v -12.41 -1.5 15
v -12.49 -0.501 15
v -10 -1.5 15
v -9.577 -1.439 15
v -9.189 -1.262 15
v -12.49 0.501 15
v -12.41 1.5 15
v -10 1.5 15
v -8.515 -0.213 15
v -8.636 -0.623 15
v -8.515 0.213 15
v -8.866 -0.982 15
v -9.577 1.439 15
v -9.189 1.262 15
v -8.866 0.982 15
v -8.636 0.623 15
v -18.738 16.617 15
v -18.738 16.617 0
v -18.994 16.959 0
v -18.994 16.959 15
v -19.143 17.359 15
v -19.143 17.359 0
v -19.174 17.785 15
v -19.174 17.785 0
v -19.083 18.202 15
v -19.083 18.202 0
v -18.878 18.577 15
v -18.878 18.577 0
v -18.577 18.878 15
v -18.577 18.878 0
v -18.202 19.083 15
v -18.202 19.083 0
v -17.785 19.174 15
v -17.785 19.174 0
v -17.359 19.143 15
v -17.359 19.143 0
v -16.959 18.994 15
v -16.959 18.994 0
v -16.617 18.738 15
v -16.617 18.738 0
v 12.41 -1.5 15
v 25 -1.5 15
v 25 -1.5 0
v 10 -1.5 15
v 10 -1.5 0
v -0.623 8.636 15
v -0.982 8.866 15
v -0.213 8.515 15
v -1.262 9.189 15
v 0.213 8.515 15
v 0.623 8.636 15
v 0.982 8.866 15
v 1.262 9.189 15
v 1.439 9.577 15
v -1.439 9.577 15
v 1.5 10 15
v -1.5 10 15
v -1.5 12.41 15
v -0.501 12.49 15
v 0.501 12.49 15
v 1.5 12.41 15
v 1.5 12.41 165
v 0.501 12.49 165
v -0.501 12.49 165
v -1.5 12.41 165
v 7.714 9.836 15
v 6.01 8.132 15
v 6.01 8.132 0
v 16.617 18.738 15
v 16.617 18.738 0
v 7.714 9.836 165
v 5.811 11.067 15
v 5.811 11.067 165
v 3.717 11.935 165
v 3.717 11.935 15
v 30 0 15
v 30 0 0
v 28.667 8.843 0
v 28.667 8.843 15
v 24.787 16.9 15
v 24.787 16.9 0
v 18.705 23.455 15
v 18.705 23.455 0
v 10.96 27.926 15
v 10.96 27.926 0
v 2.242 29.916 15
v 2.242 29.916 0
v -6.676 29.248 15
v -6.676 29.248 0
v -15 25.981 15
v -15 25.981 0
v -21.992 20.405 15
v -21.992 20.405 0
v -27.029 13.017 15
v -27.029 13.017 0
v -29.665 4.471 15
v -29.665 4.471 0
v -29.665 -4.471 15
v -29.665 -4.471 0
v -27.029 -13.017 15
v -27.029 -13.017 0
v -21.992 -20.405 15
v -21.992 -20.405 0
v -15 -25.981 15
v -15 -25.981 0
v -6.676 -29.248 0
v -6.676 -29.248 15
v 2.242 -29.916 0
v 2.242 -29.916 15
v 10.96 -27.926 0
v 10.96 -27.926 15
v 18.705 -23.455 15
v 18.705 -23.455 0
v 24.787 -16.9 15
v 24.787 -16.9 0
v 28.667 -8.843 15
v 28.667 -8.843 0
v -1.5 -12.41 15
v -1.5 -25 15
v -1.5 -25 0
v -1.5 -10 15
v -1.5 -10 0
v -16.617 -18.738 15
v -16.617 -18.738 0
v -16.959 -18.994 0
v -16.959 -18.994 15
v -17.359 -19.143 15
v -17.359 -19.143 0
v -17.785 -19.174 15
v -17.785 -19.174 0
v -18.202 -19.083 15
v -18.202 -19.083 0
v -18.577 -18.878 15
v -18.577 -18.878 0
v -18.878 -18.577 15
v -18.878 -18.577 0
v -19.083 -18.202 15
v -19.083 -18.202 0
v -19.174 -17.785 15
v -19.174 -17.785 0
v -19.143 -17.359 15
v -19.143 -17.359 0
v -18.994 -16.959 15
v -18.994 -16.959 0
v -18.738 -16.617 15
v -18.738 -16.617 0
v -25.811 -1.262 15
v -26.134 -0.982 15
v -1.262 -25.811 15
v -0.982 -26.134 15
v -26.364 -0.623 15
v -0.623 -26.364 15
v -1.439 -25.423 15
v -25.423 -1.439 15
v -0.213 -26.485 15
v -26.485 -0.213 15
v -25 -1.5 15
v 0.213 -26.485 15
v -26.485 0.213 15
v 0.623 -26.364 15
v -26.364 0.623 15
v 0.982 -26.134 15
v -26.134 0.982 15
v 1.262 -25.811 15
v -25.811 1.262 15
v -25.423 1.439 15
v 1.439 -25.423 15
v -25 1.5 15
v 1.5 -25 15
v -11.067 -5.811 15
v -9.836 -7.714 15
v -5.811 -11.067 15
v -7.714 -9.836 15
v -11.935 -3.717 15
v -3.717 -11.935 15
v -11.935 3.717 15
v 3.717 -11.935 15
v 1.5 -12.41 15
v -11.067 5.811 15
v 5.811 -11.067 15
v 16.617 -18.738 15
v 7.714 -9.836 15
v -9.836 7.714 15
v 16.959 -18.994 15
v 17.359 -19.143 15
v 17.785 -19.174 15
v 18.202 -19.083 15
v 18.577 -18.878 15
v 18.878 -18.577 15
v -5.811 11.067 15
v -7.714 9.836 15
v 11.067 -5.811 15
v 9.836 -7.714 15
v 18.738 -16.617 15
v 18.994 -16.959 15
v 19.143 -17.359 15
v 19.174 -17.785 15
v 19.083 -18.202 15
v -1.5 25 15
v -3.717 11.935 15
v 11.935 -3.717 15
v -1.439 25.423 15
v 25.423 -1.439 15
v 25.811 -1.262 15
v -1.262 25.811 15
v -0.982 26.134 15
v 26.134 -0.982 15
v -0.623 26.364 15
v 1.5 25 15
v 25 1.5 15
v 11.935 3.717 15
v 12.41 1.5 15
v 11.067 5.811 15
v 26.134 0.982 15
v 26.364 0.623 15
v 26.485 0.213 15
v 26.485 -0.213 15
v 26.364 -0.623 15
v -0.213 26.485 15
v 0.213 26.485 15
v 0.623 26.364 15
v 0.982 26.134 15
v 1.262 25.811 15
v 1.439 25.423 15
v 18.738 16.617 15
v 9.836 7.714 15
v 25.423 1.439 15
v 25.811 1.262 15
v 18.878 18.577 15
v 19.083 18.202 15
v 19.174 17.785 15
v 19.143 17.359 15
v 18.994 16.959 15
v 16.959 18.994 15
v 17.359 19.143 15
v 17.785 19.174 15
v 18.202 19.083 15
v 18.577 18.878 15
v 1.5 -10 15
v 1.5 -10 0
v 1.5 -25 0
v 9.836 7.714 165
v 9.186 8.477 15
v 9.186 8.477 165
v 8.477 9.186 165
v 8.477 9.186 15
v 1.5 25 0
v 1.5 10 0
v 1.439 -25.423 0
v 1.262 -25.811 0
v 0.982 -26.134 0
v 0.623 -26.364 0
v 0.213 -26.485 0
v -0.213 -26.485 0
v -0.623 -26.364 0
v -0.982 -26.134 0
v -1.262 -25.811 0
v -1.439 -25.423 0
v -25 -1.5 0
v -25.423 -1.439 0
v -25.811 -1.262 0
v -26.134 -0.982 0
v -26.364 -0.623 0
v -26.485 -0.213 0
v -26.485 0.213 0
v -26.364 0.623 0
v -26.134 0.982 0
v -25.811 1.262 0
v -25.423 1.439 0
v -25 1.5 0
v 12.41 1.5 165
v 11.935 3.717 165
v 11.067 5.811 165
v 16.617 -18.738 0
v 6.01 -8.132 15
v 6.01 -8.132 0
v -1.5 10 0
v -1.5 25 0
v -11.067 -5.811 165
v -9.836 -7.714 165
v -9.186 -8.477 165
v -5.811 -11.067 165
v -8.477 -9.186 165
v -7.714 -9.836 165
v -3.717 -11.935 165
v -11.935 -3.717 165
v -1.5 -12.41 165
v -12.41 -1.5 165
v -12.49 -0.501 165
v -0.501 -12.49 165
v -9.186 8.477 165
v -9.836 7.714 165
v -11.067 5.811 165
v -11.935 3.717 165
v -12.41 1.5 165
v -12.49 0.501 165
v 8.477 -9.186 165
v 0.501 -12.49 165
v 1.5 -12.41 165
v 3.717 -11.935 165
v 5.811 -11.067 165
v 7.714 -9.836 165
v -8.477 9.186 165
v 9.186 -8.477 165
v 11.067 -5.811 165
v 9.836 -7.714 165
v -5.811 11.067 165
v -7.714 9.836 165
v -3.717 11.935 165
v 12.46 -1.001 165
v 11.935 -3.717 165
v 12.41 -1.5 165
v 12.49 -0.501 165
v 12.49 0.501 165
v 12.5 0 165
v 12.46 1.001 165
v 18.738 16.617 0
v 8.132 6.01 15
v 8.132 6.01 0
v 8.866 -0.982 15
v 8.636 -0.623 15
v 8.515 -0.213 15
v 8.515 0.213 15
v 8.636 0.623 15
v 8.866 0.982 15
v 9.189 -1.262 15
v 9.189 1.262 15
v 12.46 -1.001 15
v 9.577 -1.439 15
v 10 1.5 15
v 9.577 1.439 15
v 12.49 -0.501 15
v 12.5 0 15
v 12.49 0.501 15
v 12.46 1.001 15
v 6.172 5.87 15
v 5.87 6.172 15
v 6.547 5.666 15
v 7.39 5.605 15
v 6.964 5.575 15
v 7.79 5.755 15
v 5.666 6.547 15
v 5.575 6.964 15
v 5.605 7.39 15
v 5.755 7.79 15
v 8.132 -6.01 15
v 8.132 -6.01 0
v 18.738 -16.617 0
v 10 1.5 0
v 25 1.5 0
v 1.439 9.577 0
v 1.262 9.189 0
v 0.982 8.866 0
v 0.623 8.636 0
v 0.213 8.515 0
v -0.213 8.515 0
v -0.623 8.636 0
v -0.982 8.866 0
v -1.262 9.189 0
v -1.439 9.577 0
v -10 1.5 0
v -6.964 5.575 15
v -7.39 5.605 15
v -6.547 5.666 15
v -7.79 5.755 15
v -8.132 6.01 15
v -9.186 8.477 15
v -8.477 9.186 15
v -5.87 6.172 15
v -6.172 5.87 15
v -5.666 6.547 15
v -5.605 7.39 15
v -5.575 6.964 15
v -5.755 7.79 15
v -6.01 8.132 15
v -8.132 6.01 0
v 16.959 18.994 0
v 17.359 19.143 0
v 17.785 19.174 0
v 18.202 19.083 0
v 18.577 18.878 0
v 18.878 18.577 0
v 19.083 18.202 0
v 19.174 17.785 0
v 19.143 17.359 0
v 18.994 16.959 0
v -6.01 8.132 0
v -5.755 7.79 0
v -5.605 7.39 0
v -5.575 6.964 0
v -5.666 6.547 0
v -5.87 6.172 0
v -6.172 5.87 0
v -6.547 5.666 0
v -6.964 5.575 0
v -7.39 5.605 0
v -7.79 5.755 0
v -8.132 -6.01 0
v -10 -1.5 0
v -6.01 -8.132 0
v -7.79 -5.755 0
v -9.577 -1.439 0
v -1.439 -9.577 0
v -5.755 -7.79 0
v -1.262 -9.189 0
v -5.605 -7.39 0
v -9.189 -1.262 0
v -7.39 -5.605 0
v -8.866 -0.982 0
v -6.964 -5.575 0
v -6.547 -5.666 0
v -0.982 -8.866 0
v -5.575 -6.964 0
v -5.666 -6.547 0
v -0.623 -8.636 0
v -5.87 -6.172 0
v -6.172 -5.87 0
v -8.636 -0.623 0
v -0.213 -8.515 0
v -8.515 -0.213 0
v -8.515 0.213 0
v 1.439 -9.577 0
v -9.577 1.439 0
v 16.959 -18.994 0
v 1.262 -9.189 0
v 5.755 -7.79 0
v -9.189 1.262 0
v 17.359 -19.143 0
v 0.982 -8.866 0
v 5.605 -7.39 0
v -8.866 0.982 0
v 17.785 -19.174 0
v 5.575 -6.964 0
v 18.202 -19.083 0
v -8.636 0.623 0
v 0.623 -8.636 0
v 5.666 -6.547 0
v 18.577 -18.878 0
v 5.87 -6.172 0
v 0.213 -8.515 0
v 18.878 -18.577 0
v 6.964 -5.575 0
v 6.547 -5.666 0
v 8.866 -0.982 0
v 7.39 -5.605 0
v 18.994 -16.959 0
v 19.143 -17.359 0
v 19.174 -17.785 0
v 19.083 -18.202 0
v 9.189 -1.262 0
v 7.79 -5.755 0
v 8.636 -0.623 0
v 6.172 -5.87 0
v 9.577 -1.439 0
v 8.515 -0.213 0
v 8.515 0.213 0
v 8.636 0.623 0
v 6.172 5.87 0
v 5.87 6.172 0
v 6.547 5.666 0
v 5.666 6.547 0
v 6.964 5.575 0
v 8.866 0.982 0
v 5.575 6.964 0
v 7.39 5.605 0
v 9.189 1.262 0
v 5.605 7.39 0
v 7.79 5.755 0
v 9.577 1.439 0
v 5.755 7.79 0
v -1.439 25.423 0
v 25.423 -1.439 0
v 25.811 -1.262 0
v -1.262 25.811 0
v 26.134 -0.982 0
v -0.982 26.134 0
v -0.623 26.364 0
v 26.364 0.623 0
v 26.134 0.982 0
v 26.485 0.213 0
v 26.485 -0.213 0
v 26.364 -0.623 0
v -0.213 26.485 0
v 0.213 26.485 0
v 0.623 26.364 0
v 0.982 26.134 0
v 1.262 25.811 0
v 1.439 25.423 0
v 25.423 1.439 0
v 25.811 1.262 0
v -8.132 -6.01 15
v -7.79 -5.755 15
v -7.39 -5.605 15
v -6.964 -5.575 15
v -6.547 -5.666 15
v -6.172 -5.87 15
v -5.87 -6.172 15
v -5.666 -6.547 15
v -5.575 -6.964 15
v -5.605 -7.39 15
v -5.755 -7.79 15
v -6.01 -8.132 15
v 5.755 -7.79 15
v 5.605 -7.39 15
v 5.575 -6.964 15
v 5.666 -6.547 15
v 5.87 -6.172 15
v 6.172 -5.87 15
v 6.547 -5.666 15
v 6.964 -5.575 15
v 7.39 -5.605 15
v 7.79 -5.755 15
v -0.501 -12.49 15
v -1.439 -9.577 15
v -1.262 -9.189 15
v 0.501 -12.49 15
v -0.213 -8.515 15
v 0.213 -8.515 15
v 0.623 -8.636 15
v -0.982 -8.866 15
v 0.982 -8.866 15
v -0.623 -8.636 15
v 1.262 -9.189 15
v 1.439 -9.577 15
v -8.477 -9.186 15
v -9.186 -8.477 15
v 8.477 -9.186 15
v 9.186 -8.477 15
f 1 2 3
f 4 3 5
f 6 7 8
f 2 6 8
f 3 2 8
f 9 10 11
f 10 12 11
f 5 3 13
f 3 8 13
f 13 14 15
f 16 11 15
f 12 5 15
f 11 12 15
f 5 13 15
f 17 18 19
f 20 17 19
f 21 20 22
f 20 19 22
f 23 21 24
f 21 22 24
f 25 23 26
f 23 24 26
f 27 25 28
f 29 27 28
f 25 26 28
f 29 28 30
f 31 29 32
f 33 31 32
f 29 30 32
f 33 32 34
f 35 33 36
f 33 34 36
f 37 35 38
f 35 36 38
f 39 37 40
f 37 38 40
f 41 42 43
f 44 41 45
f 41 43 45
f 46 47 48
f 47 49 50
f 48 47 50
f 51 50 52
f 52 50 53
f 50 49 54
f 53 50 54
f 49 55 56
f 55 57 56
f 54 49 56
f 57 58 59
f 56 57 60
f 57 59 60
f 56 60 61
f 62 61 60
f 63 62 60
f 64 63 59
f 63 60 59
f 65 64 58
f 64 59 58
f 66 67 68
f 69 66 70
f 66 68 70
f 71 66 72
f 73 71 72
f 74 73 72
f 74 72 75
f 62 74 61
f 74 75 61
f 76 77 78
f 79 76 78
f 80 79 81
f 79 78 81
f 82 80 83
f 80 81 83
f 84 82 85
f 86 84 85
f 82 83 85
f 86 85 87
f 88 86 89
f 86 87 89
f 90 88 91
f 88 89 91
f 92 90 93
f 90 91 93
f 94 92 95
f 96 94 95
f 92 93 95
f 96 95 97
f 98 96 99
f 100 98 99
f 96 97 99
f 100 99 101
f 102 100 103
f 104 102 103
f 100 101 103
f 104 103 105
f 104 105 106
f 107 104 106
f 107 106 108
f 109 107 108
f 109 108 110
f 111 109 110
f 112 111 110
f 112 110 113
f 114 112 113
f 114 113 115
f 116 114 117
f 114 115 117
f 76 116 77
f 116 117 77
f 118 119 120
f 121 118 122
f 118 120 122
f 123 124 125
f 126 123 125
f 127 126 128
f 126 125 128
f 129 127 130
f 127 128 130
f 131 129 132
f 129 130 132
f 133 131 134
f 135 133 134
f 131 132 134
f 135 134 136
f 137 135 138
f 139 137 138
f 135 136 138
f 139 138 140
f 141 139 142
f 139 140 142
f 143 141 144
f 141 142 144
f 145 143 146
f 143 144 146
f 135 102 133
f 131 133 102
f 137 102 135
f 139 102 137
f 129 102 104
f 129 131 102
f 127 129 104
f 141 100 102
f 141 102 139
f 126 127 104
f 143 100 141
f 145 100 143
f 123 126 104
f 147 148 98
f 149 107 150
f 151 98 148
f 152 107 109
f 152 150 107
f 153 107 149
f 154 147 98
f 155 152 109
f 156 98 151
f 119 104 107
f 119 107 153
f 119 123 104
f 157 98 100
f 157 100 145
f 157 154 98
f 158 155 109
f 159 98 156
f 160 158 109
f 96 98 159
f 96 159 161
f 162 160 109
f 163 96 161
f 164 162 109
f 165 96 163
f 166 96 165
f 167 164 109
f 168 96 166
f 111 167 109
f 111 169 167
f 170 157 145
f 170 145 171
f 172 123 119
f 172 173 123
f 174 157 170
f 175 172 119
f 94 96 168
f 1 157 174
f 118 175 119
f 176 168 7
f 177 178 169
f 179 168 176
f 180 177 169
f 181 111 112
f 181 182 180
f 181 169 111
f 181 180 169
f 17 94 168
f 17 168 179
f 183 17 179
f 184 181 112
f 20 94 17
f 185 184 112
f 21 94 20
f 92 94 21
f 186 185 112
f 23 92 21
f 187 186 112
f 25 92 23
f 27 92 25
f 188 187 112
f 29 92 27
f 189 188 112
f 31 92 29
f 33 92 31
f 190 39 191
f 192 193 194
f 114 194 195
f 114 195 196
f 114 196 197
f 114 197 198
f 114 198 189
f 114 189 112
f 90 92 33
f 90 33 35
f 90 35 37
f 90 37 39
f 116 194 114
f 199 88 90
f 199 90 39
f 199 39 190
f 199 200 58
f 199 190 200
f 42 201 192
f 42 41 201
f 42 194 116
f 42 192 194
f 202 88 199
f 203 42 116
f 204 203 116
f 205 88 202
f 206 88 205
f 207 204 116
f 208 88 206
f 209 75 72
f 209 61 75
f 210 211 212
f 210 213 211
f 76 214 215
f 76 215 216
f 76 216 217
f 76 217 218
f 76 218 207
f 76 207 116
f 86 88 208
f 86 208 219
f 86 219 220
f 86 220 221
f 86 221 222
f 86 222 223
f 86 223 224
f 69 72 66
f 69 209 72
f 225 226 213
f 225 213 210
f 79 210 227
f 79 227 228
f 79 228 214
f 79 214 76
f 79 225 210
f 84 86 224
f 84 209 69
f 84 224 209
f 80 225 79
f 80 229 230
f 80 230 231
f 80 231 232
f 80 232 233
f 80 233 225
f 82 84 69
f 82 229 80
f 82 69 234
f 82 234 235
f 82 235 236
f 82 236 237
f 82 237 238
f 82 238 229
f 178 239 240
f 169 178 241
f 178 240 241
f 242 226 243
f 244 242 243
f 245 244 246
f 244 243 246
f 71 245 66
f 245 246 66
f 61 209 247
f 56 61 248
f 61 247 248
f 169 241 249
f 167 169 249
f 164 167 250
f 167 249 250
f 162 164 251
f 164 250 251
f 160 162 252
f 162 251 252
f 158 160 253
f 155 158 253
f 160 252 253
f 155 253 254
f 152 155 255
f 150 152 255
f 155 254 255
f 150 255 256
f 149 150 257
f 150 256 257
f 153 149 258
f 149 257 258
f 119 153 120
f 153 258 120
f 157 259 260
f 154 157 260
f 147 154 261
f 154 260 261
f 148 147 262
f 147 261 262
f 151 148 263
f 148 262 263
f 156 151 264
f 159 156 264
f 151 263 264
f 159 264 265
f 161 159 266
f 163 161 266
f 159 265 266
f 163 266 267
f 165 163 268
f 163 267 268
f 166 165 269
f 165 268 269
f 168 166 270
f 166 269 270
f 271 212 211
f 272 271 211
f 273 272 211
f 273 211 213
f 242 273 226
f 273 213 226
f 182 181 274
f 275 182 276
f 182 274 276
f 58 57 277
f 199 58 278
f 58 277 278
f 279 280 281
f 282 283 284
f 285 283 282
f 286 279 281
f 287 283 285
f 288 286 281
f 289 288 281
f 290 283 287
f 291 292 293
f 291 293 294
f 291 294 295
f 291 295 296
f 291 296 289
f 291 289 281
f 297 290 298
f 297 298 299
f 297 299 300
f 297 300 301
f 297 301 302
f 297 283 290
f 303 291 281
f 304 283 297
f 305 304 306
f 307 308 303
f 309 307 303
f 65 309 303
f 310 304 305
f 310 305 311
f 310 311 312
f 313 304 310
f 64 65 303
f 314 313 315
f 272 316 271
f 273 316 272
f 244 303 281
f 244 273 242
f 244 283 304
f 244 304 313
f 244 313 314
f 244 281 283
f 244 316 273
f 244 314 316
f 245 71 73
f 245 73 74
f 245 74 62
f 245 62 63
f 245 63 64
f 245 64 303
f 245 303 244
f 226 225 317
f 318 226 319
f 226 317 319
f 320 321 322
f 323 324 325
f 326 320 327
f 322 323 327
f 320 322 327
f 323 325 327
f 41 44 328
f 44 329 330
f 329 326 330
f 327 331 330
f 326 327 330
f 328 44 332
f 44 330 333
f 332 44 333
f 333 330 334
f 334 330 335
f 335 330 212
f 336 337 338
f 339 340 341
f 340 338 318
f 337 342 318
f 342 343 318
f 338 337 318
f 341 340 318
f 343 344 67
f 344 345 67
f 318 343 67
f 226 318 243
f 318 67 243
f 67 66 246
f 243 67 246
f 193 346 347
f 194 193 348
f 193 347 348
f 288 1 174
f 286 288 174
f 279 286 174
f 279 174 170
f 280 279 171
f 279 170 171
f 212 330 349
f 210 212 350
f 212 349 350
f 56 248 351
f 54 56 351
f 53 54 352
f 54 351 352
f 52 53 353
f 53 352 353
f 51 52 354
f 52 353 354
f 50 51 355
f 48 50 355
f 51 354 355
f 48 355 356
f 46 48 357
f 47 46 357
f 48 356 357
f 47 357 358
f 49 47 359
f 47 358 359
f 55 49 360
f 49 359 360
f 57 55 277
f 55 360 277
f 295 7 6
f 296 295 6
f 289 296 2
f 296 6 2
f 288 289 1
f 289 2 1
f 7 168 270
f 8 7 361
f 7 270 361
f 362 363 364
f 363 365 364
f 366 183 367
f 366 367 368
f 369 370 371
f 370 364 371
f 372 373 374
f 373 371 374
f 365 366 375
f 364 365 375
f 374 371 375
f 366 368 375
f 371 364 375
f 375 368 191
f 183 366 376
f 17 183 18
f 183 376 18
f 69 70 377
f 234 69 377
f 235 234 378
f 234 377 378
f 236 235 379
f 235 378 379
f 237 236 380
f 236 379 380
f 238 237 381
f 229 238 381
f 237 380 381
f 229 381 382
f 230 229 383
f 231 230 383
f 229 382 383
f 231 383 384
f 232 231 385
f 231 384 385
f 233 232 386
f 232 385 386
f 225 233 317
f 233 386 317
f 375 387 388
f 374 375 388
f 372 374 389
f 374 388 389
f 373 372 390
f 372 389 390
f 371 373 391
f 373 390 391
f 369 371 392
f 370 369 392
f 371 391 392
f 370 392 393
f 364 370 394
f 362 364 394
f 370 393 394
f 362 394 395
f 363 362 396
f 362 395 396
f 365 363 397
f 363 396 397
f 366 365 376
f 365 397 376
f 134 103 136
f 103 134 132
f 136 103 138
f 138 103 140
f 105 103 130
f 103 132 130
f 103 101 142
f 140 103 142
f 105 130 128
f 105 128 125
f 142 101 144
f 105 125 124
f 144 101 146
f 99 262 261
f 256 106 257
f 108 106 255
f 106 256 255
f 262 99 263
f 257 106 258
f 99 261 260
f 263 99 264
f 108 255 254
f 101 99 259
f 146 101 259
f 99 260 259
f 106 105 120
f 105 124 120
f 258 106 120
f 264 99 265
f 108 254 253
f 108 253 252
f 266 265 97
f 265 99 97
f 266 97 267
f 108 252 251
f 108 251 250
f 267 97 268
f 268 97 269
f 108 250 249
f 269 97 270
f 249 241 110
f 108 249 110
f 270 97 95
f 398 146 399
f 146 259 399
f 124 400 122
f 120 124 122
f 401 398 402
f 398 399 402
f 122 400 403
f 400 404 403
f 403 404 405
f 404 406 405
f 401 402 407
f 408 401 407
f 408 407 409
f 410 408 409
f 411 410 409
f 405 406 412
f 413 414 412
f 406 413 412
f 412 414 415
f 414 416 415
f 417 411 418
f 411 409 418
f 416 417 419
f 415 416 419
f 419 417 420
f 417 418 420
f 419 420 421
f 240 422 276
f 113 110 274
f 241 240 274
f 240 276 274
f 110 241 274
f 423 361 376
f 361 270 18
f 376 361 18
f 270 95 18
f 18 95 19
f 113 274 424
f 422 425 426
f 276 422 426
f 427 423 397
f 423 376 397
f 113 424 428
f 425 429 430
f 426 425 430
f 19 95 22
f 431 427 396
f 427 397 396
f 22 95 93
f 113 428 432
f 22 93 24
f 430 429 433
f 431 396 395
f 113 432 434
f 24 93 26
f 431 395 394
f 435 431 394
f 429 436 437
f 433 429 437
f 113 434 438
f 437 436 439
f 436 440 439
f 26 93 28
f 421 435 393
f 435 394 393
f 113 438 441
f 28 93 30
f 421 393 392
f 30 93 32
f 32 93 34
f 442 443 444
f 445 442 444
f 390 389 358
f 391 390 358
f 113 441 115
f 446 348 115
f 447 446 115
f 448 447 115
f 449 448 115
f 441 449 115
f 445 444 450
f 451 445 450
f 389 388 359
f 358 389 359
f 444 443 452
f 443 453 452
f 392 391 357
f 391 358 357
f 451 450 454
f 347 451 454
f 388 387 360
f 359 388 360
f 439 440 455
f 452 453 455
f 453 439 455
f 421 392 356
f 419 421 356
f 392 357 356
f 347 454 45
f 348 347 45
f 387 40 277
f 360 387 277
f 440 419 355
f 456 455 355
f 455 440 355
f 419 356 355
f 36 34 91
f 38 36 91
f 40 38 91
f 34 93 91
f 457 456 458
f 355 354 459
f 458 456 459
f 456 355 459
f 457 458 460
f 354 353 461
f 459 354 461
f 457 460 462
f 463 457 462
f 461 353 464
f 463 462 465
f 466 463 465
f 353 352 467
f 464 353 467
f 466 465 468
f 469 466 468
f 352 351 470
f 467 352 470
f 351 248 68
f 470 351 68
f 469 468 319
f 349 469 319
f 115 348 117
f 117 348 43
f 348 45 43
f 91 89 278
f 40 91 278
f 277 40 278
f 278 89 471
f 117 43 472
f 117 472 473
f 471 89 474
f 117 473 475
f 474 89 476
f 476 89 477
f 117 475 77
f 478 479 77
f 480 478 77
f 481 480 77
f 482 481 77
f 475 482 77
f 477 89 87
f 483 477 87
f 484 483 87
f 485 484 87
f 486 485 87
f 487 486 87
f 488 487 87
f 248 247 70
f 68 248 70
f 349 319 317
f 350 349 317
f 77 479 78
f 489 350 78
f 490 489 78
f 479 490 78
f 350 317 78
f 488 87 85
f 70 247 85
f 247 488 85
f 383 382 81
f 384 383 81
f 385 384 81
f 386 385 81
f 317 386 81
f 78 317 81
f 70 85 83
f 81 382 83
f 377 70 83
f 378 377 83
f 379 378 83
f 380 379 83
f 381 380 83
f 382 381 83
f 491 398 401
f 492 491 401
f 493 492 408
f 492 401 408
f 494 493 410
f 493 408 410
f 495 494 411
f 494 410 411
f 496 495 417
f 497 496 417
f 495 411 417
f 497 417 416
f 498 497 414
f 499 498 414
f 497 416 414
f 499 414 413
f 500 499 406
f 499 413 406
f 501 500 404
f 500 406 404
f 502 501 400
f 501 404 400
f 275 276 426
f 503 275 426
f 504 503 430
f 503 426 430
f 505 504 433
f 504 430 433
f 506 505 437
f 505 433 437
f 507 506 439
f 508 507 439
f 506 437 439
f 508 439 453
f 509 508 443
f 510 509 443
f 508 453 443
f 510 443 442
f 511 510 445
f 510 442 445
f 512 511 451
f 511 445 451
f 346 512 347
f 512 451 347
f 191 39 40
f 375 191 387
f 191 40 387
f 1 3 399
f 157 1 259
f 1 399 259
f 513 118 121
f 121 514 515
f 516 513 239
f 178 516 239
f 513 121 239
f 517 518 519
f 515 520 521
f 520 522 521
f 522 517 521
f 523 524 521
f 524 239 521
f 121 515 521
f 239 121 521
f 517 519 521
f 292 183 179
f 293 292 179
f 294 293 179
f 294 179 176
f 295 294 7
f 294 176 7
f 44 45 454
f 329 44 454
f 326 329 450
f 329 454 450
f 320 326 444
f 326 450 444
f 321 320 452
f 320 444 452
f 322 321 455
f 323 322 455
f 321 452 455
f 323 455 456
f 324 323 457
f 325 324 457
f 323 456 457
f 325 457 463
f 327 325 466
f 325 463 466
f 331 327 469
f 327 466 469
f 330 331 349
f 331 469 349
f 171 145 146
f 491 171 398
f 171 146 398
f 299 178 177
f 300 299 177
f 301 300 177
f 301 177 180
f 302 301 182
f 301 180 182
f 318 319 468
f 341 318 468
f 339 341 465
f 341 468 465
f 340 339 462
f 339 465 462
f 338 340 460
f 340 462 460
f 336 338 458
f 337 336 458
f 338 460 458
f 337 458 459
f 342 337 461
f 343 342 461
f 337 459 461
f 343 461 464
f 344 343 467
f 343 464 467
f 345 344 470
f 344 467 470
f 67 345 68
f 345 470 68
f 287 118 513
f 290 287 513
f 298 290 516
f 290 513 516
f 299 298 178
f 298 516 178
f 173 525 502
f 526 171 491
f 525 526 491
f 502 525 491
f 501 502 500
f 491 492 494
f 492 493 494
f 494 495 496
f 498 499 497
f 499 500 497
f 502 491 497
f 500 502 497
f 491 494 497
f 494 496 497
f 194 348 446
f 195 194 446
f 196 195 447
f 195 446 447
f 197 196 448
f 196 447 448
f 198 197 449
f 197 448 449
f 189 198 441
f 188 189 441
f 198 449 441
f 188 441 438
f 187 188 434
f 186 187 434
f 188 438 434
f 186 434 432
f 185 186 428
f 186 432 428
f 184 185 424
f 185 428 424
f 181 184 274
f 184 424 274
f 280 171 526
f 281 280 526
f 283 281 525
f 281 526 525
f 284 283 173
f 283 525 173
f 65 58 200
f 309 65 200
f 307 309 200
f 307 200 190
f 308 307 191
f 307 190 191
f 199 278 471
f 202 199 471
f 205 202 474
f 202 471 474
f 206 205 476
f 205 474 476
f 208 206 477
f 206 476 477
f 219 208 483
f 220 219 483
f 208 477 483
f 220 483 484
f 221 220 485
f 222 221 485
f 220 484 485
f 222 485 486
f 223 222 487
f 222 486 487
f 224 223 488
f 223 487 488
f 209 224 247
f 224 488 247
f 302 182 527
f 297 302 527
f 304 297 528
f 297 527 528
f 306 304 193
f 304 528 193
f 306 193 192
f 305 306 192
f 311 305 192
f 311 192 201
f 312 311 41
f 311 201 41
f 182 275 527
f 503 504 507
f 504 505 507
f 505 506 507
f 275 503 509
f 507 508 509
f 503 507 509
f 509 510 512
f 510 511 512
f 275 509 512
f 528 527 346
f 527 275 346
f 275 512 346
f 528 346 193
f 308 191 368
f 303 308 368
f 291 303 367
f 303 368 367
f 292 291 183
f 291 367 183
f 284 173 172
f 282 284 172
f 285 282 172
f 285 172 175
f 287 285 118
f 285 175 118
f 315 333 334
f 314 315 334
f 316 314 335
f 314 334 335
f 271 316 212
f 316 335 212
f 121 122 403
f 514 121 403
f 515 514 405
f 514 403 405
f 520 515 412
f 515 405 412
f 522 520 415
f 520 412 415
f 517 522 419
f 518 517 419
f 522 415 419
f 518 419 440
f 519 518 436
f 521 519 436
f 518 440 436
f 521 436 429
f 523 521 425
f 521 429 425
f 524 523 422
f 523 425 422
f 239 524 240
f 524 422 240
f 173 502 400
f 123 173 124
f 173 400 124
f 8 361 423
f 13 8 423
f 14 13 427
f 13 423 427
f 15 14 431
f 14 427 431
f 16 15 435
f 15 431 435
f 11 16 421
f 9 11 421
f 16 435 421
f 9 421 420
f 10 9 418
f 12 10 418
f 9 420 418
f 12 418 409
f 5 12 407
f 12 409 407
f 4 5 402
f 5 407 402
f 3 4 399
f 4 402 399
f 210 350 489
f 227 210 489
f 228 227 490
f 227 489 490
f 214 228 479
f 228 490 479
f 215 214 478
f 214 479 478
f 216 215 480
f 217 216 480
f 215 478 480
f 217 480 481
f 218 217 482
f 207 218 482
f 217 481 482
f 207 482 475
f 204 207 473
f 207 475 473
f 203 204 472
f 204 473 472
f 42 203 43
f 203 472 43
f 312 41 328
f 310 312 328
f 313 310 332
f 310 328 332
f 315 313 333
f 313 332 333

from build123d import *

# Parameters (mm, degrees)
F0_R     = 30
F1_DEPTH = 15
F3_DEPTH = 150


with BuildPart() as f1:
    # F0 (on Top) → F1 (new body)
    with BuildSketch(Plane.XY):
        Circle(F0_R)
        with BuildLine():
            ThreePointArc((-16.6170093579, -18.7383297014), (-18.7383297014, -18.7383297014), (-18.7383297014, -16.6170093579))
            Line((-18.7383297014, -16.6170093579), (-8.1317279836, -6.0104076401))
            ThreePointArc((-8.1317279836, -6.0104076401), (-6.0104076401, -6.0104076401), (-6.0104076401, -8.1317279836))
            Line((-6.0104076401, -8.1317279836), (-16.6170093579, -18.7383297014))
        make_face(mode=Mode.SUBTRACT)
        with BuildLine():
            ThreePointArc((1.5, -25), (0, -26.5), (-1.5, -25))
            Line((-1.5, -25), (-1.5, -10))
            ThreePointArc((-1.5, -10), (0, -8.5), (1.5, -10))
            Line((1.5, -10), (1.5, -25))
        make_face(mode=Mode.SUBTRACT)
        with BuildLine():
            ThreePointArc((18.7383297014, -16.6170093579), (18.7383297014, -18.7383297014), (16.6170093579, -18.7383297014))
            Line((16.6170093579, -18.7383297014), (6.0104076401, -8.1317279836))
            ThreePointArc((6.0104076401, -8.1317279836), (6.0104076401, -6.0104076401), (8.1317279836, -6.0104076401))
            Line((8.1317279836, -6.0104076401), (18.7383297014, -16.6170093579))
        make_face(mode=Mode.SUBTRACT)
        with BuildLine():
            ThreePointArc((-25, -1.5), (-26.5, 0), (-25, 1.5))
            Line((-25, 1.5), (-10, 1.5))
            ThreePointArc((-10, 1.5), (-8.5, 0), (-10, -1.5))
            Line((-10, -1.5), (-25, -1.5))
        make_face(mode=Mode.SUBTRACT)
        with BuildLine():
            ThreePointArc((-18.7383297014, 16.6170093579), (-18.7383297014, 18.7383297014), (-16.6170093579, 18.7383297014))
            Line((-16.6170093579, 18.7383297014), (-6.0104076401, 8.1317279836))
            ThreePointArc((-6.0104076401, 8.1317279836), (-6.0104076401, 6.0104076401), (-8.1317279836, 6.0104076401))
            Line((-8.1317279836, 6.0104076401), (-18.7383297014, 16.6170093579))
        make_face(mode=Mode.SUBTRACT)
        with BuildLine():
            ThreePointArc((16.6170093579, 18.7383297014), (18.7383297014, 18.7383297014), (18.7383297014, 16.6170093579))
            Line((18.7383297014, 16.6170093579), (8.1317279836, 6.0104076401))
            ThreePointArc((8.1317279836, 6.0104076401), (6.0104076401, 6.0104076401), (6.0104076401, 8.1317279836))
            Line((6.0104076401, 8.1317279836), (16.6170093579, 18.7383297014))
        make_face(mode=Mode.SUBTRACT)
        with BuildLine():
            ThreePointArc((25, 1.5), (26.5, 0), (25, -1.5))
            Line((25, -1.5), (10, -1.5))
            ThreePointArc((10, -1.5), (8.5, 0), (10, 1.5))
            Line((10, 1.5), (25, 1.5))
        make_face(mode=Mode.SUBTRACT)
        with BuildLine():
            ThreePointArc((-1.5, 25), (0, 26.5), (1.5, 25))
            Line((1.5, 25), (1.5, 10))
            ThreePointArc((1.5, 10), (0, 8.5), (-1.5, 10))
            Line((-1.5, 10), (-1.5, 25))
        make_face(mode=Mode.SUBTRACT)
    extrude(amount=F1_DEPTH)

    # F2 (on face) → F3 (join)
    with BuildSketch(Plane.XY.offset(15)):
        with BuildLine():
            Line((10, 1.5), (12.409673646, 1.5))
            ThreePointArc((12.409673646, 1.5), (11.5484941564, 4.7835429046), (9.8356245592, 7.7143042156))
            Line((9.8356245592, 7.7143042156), (8.1317279836, 6.0104076401))
            ThreePointArc((8.1317279836, 6.0104076401), (6.0104076401, 6.0104076401), (6.0104076401, 8.1317279836))
            Line((6.0104076401, 8.1317279836), (7.7143042156, 9.8356245592))
            ThreePointArc((7.7143042156, 9.8356245592), (4.7835429046, 11.5484941564), (1.5, 12.409673646))
            Line((1.5, 12.409673646), (1.5, 10))
            ThreePointArc((1.5, 10), (0, 8.5), (-1.5, 10))
            Line((-1.5, 10), (-1.5, 12.409673646))
            ThreePointArc((-1.5, 12.409673646), (-4.7835429046, 11.5484941564), (-7.7143042156, 9.8356245592))
            Line((-7.7143042156, 9.8356245592), (-6.0104076401, 8.1317279836))
            ThreePointArc((-6.0104076401, 8.1317279836), (-6.0104076401, 6.0104076401), (-8.1317279836, 6.0104076401))
            Line((-8.1317279836, 6.0104076401), (-9.8356245592, 7.7143042156))
            ThreePointArc((-9.8356245592, 7.7143042156), (-11.5484941564, 4.7835429046), (-12.409673646, 1.5))
            Line((-12.409673646, 1.5), (-10, 1.5))
            ThreePointArc((-10, 1.5), (-8.5, 0), (-10, -1.5))
            Line((-10, -1.5), (-12.409673646, -1.5))
            ThreePointArc((-12.409673646, -1.5), (-11.5484941564, -4.7835429046), (-9.8356245592, -7.7143042156))
            Line((-9.8356245592, -7.7143042156), (-8.1317279836, -6.0104076401))
            ThreePointArc((-8.1317279836, -6.0104076401), (-6.0104076401, -6.0104076401), (-6.0104076401, -8.1317279836))
            Line((-6.0104076401, -8.1317279836), (-7.7143042156, -9.8356245592))
            ThreePointArc((-7.7143042156, -9.8356245592), (-4.7835429046, -11.5484941564), (-1.5, -12.409673646))
            Line((-1.5, -12.409673646), (-1.5, -10))
            ThreePointArc((-1.5, -10), (0, -8.5), (1.5, -10))
            Line((1.5, -10), (1.5, -12.409673646))
            ThreePointArc((1.5, -12.409673646), (4.7835429046, -11.5484941564), (7.7143042156, -9.8356245592))
            Line((7.7143042156, -9.8356245592), (6.0104076401, -8.1317279836))
            ThreePointArc((6.0104076401, -8.1317279836), (6.0104076401, -6.0104076401), (8.1317279836, -6.0104076401))
            Line((8.1317279836, -6.0104076401), (9.8356245592, -7.7143042156))
            ThreePointArc((9.8356245592, -7.7143042156), (11.5484941564, -4.7835429046), (12.409673646, -1.5))
            Line((12.409673646, -1.5), (10, -1.5))
            ThreePointArc((10, -1.5), (8.5, 0), (10, 1.5))
        make_face()
        with BuildLine():
            Line((-10, 1.5), (-12.409673646, 1.5))
            ThreePointArc((-12.409673646, 1.5), (-12.5, 0), (-12.409673646, -1.5))
            Line((-12.409673646, -1.5), (-10, -1.5))
            ThreePointArc((-10, -1.5), (-8.5, 0), (-10, 1.5))
        make_face()
        with BuildLine():
            Line((-6.0104076401, 8.1317279836), (-7.7143042156, 9.8356245592))
            ThreePointArc((-7.7143042156, 9.8356245592), (-8.8388347648, 8.8388347648), (-9.8356245592, 7.7143042156))
            Line((-9.8356245592, 7.7143042156), (-8.1317279836, 6.0104076401))
            ThreePointArc((-8.1317279836, 6.0104076401), (-6.0104076401, 6.0104076401), (-6.0104076401, 8.1317279836))
        make_face()
        with BuildLine():
            Line((1.5, 10), (1.5, 12.409673646))
            ThreePointArc((1.5, 12.409673646), (0, 12.5), (-1.5, 12.409673646))
            Line((-1.5, 12.409673646), (-1.5, 10))
            ThreePointArc((-1.5, 10), (0, 8.5), (1.5, 10))
        make_face()
        with BuildLine():
            Line((8.1317279836, 6.0104076401), (9.8356245592, 7.7143042156))
            ThreePointArc((9.8356245592, 7.7143042156), (8.8388347648, 8.8388347648), (7.7143042156, 9.8356245592))
            Line((7.7143042156, 9.8356245592), (6.0104076401, 8.1317279836))
            ThreePointArc((6.0104076401, 8.1317279836), (6.0104076401, 6.0104076401), (8.1317279836, 6.0104076401))
        make_face()
        with BuildLine():
            ThreePointArc((12.409673646, -1.5), (12.4773979774, -0.7513585779), (12.5, 0))
            ThreePointArc((12.5, 0), (12.4773979774, 0.7513585779), (12.409673646, 1.5))
            Line((12.409673646, 1.5), (10, 1.5))
            ThreePointArc((10, 1.5), (8.5, 0), (10, -1.5))
            Line((10, -1.5), (12.409673646, -1.5))
        make_face()
        with BuildLine():
            ThreePointArc((7.7143042156, -9.8356245592), (8.8388347648, -8.8388347648), (9.8356245592, -7.7143042156))
            Line((9.8356245592, -7.7143042156), (8.1317279836, -6.0104076401))
            ThreePointArc((8.1317279836, -6.0104076401), (6.0104076401, -6.0104076401), (6.0104076401, -8.1317279836))
            Line((6.0104076401, -8.1317279836), (7.7143042156, -9.8356245592))
        make_face()
        with BuildLine():
            ThreePointArc((-1.5, -12.409673646), (0, -12.5), (1.5, -12.409673646))
            Line((1.5, -12.409673646), (1.5, -10))
            ThreePointArc((1.5, -10), (0, -8.5), (-1.5, -10))
            Line((-1.5, -10), (-1.5, -12.409673646))
        make_face()
        with BuildLine():
            ThreePointArc((-9.8356245592, -7.7143042156), (-8.8388347648, -8.8388347648), (-7.7143042156, -9.8356245592))
            Line((-7.7143042156, -9.8356245592), (-6.0104076401, -8.1317279836))
            ThreePointArc((-6.0104076401, -8.1317279836), (-6.0104076401, -6.0104076401), (-8.1317279836, -6.0104076401))
            Line((-8.1317279836, -6.0104076401), (-9.8356245592, -7.7143042156))
        make_face()
    extrude(amount=F3_DEPTH)


solid = f1.part
